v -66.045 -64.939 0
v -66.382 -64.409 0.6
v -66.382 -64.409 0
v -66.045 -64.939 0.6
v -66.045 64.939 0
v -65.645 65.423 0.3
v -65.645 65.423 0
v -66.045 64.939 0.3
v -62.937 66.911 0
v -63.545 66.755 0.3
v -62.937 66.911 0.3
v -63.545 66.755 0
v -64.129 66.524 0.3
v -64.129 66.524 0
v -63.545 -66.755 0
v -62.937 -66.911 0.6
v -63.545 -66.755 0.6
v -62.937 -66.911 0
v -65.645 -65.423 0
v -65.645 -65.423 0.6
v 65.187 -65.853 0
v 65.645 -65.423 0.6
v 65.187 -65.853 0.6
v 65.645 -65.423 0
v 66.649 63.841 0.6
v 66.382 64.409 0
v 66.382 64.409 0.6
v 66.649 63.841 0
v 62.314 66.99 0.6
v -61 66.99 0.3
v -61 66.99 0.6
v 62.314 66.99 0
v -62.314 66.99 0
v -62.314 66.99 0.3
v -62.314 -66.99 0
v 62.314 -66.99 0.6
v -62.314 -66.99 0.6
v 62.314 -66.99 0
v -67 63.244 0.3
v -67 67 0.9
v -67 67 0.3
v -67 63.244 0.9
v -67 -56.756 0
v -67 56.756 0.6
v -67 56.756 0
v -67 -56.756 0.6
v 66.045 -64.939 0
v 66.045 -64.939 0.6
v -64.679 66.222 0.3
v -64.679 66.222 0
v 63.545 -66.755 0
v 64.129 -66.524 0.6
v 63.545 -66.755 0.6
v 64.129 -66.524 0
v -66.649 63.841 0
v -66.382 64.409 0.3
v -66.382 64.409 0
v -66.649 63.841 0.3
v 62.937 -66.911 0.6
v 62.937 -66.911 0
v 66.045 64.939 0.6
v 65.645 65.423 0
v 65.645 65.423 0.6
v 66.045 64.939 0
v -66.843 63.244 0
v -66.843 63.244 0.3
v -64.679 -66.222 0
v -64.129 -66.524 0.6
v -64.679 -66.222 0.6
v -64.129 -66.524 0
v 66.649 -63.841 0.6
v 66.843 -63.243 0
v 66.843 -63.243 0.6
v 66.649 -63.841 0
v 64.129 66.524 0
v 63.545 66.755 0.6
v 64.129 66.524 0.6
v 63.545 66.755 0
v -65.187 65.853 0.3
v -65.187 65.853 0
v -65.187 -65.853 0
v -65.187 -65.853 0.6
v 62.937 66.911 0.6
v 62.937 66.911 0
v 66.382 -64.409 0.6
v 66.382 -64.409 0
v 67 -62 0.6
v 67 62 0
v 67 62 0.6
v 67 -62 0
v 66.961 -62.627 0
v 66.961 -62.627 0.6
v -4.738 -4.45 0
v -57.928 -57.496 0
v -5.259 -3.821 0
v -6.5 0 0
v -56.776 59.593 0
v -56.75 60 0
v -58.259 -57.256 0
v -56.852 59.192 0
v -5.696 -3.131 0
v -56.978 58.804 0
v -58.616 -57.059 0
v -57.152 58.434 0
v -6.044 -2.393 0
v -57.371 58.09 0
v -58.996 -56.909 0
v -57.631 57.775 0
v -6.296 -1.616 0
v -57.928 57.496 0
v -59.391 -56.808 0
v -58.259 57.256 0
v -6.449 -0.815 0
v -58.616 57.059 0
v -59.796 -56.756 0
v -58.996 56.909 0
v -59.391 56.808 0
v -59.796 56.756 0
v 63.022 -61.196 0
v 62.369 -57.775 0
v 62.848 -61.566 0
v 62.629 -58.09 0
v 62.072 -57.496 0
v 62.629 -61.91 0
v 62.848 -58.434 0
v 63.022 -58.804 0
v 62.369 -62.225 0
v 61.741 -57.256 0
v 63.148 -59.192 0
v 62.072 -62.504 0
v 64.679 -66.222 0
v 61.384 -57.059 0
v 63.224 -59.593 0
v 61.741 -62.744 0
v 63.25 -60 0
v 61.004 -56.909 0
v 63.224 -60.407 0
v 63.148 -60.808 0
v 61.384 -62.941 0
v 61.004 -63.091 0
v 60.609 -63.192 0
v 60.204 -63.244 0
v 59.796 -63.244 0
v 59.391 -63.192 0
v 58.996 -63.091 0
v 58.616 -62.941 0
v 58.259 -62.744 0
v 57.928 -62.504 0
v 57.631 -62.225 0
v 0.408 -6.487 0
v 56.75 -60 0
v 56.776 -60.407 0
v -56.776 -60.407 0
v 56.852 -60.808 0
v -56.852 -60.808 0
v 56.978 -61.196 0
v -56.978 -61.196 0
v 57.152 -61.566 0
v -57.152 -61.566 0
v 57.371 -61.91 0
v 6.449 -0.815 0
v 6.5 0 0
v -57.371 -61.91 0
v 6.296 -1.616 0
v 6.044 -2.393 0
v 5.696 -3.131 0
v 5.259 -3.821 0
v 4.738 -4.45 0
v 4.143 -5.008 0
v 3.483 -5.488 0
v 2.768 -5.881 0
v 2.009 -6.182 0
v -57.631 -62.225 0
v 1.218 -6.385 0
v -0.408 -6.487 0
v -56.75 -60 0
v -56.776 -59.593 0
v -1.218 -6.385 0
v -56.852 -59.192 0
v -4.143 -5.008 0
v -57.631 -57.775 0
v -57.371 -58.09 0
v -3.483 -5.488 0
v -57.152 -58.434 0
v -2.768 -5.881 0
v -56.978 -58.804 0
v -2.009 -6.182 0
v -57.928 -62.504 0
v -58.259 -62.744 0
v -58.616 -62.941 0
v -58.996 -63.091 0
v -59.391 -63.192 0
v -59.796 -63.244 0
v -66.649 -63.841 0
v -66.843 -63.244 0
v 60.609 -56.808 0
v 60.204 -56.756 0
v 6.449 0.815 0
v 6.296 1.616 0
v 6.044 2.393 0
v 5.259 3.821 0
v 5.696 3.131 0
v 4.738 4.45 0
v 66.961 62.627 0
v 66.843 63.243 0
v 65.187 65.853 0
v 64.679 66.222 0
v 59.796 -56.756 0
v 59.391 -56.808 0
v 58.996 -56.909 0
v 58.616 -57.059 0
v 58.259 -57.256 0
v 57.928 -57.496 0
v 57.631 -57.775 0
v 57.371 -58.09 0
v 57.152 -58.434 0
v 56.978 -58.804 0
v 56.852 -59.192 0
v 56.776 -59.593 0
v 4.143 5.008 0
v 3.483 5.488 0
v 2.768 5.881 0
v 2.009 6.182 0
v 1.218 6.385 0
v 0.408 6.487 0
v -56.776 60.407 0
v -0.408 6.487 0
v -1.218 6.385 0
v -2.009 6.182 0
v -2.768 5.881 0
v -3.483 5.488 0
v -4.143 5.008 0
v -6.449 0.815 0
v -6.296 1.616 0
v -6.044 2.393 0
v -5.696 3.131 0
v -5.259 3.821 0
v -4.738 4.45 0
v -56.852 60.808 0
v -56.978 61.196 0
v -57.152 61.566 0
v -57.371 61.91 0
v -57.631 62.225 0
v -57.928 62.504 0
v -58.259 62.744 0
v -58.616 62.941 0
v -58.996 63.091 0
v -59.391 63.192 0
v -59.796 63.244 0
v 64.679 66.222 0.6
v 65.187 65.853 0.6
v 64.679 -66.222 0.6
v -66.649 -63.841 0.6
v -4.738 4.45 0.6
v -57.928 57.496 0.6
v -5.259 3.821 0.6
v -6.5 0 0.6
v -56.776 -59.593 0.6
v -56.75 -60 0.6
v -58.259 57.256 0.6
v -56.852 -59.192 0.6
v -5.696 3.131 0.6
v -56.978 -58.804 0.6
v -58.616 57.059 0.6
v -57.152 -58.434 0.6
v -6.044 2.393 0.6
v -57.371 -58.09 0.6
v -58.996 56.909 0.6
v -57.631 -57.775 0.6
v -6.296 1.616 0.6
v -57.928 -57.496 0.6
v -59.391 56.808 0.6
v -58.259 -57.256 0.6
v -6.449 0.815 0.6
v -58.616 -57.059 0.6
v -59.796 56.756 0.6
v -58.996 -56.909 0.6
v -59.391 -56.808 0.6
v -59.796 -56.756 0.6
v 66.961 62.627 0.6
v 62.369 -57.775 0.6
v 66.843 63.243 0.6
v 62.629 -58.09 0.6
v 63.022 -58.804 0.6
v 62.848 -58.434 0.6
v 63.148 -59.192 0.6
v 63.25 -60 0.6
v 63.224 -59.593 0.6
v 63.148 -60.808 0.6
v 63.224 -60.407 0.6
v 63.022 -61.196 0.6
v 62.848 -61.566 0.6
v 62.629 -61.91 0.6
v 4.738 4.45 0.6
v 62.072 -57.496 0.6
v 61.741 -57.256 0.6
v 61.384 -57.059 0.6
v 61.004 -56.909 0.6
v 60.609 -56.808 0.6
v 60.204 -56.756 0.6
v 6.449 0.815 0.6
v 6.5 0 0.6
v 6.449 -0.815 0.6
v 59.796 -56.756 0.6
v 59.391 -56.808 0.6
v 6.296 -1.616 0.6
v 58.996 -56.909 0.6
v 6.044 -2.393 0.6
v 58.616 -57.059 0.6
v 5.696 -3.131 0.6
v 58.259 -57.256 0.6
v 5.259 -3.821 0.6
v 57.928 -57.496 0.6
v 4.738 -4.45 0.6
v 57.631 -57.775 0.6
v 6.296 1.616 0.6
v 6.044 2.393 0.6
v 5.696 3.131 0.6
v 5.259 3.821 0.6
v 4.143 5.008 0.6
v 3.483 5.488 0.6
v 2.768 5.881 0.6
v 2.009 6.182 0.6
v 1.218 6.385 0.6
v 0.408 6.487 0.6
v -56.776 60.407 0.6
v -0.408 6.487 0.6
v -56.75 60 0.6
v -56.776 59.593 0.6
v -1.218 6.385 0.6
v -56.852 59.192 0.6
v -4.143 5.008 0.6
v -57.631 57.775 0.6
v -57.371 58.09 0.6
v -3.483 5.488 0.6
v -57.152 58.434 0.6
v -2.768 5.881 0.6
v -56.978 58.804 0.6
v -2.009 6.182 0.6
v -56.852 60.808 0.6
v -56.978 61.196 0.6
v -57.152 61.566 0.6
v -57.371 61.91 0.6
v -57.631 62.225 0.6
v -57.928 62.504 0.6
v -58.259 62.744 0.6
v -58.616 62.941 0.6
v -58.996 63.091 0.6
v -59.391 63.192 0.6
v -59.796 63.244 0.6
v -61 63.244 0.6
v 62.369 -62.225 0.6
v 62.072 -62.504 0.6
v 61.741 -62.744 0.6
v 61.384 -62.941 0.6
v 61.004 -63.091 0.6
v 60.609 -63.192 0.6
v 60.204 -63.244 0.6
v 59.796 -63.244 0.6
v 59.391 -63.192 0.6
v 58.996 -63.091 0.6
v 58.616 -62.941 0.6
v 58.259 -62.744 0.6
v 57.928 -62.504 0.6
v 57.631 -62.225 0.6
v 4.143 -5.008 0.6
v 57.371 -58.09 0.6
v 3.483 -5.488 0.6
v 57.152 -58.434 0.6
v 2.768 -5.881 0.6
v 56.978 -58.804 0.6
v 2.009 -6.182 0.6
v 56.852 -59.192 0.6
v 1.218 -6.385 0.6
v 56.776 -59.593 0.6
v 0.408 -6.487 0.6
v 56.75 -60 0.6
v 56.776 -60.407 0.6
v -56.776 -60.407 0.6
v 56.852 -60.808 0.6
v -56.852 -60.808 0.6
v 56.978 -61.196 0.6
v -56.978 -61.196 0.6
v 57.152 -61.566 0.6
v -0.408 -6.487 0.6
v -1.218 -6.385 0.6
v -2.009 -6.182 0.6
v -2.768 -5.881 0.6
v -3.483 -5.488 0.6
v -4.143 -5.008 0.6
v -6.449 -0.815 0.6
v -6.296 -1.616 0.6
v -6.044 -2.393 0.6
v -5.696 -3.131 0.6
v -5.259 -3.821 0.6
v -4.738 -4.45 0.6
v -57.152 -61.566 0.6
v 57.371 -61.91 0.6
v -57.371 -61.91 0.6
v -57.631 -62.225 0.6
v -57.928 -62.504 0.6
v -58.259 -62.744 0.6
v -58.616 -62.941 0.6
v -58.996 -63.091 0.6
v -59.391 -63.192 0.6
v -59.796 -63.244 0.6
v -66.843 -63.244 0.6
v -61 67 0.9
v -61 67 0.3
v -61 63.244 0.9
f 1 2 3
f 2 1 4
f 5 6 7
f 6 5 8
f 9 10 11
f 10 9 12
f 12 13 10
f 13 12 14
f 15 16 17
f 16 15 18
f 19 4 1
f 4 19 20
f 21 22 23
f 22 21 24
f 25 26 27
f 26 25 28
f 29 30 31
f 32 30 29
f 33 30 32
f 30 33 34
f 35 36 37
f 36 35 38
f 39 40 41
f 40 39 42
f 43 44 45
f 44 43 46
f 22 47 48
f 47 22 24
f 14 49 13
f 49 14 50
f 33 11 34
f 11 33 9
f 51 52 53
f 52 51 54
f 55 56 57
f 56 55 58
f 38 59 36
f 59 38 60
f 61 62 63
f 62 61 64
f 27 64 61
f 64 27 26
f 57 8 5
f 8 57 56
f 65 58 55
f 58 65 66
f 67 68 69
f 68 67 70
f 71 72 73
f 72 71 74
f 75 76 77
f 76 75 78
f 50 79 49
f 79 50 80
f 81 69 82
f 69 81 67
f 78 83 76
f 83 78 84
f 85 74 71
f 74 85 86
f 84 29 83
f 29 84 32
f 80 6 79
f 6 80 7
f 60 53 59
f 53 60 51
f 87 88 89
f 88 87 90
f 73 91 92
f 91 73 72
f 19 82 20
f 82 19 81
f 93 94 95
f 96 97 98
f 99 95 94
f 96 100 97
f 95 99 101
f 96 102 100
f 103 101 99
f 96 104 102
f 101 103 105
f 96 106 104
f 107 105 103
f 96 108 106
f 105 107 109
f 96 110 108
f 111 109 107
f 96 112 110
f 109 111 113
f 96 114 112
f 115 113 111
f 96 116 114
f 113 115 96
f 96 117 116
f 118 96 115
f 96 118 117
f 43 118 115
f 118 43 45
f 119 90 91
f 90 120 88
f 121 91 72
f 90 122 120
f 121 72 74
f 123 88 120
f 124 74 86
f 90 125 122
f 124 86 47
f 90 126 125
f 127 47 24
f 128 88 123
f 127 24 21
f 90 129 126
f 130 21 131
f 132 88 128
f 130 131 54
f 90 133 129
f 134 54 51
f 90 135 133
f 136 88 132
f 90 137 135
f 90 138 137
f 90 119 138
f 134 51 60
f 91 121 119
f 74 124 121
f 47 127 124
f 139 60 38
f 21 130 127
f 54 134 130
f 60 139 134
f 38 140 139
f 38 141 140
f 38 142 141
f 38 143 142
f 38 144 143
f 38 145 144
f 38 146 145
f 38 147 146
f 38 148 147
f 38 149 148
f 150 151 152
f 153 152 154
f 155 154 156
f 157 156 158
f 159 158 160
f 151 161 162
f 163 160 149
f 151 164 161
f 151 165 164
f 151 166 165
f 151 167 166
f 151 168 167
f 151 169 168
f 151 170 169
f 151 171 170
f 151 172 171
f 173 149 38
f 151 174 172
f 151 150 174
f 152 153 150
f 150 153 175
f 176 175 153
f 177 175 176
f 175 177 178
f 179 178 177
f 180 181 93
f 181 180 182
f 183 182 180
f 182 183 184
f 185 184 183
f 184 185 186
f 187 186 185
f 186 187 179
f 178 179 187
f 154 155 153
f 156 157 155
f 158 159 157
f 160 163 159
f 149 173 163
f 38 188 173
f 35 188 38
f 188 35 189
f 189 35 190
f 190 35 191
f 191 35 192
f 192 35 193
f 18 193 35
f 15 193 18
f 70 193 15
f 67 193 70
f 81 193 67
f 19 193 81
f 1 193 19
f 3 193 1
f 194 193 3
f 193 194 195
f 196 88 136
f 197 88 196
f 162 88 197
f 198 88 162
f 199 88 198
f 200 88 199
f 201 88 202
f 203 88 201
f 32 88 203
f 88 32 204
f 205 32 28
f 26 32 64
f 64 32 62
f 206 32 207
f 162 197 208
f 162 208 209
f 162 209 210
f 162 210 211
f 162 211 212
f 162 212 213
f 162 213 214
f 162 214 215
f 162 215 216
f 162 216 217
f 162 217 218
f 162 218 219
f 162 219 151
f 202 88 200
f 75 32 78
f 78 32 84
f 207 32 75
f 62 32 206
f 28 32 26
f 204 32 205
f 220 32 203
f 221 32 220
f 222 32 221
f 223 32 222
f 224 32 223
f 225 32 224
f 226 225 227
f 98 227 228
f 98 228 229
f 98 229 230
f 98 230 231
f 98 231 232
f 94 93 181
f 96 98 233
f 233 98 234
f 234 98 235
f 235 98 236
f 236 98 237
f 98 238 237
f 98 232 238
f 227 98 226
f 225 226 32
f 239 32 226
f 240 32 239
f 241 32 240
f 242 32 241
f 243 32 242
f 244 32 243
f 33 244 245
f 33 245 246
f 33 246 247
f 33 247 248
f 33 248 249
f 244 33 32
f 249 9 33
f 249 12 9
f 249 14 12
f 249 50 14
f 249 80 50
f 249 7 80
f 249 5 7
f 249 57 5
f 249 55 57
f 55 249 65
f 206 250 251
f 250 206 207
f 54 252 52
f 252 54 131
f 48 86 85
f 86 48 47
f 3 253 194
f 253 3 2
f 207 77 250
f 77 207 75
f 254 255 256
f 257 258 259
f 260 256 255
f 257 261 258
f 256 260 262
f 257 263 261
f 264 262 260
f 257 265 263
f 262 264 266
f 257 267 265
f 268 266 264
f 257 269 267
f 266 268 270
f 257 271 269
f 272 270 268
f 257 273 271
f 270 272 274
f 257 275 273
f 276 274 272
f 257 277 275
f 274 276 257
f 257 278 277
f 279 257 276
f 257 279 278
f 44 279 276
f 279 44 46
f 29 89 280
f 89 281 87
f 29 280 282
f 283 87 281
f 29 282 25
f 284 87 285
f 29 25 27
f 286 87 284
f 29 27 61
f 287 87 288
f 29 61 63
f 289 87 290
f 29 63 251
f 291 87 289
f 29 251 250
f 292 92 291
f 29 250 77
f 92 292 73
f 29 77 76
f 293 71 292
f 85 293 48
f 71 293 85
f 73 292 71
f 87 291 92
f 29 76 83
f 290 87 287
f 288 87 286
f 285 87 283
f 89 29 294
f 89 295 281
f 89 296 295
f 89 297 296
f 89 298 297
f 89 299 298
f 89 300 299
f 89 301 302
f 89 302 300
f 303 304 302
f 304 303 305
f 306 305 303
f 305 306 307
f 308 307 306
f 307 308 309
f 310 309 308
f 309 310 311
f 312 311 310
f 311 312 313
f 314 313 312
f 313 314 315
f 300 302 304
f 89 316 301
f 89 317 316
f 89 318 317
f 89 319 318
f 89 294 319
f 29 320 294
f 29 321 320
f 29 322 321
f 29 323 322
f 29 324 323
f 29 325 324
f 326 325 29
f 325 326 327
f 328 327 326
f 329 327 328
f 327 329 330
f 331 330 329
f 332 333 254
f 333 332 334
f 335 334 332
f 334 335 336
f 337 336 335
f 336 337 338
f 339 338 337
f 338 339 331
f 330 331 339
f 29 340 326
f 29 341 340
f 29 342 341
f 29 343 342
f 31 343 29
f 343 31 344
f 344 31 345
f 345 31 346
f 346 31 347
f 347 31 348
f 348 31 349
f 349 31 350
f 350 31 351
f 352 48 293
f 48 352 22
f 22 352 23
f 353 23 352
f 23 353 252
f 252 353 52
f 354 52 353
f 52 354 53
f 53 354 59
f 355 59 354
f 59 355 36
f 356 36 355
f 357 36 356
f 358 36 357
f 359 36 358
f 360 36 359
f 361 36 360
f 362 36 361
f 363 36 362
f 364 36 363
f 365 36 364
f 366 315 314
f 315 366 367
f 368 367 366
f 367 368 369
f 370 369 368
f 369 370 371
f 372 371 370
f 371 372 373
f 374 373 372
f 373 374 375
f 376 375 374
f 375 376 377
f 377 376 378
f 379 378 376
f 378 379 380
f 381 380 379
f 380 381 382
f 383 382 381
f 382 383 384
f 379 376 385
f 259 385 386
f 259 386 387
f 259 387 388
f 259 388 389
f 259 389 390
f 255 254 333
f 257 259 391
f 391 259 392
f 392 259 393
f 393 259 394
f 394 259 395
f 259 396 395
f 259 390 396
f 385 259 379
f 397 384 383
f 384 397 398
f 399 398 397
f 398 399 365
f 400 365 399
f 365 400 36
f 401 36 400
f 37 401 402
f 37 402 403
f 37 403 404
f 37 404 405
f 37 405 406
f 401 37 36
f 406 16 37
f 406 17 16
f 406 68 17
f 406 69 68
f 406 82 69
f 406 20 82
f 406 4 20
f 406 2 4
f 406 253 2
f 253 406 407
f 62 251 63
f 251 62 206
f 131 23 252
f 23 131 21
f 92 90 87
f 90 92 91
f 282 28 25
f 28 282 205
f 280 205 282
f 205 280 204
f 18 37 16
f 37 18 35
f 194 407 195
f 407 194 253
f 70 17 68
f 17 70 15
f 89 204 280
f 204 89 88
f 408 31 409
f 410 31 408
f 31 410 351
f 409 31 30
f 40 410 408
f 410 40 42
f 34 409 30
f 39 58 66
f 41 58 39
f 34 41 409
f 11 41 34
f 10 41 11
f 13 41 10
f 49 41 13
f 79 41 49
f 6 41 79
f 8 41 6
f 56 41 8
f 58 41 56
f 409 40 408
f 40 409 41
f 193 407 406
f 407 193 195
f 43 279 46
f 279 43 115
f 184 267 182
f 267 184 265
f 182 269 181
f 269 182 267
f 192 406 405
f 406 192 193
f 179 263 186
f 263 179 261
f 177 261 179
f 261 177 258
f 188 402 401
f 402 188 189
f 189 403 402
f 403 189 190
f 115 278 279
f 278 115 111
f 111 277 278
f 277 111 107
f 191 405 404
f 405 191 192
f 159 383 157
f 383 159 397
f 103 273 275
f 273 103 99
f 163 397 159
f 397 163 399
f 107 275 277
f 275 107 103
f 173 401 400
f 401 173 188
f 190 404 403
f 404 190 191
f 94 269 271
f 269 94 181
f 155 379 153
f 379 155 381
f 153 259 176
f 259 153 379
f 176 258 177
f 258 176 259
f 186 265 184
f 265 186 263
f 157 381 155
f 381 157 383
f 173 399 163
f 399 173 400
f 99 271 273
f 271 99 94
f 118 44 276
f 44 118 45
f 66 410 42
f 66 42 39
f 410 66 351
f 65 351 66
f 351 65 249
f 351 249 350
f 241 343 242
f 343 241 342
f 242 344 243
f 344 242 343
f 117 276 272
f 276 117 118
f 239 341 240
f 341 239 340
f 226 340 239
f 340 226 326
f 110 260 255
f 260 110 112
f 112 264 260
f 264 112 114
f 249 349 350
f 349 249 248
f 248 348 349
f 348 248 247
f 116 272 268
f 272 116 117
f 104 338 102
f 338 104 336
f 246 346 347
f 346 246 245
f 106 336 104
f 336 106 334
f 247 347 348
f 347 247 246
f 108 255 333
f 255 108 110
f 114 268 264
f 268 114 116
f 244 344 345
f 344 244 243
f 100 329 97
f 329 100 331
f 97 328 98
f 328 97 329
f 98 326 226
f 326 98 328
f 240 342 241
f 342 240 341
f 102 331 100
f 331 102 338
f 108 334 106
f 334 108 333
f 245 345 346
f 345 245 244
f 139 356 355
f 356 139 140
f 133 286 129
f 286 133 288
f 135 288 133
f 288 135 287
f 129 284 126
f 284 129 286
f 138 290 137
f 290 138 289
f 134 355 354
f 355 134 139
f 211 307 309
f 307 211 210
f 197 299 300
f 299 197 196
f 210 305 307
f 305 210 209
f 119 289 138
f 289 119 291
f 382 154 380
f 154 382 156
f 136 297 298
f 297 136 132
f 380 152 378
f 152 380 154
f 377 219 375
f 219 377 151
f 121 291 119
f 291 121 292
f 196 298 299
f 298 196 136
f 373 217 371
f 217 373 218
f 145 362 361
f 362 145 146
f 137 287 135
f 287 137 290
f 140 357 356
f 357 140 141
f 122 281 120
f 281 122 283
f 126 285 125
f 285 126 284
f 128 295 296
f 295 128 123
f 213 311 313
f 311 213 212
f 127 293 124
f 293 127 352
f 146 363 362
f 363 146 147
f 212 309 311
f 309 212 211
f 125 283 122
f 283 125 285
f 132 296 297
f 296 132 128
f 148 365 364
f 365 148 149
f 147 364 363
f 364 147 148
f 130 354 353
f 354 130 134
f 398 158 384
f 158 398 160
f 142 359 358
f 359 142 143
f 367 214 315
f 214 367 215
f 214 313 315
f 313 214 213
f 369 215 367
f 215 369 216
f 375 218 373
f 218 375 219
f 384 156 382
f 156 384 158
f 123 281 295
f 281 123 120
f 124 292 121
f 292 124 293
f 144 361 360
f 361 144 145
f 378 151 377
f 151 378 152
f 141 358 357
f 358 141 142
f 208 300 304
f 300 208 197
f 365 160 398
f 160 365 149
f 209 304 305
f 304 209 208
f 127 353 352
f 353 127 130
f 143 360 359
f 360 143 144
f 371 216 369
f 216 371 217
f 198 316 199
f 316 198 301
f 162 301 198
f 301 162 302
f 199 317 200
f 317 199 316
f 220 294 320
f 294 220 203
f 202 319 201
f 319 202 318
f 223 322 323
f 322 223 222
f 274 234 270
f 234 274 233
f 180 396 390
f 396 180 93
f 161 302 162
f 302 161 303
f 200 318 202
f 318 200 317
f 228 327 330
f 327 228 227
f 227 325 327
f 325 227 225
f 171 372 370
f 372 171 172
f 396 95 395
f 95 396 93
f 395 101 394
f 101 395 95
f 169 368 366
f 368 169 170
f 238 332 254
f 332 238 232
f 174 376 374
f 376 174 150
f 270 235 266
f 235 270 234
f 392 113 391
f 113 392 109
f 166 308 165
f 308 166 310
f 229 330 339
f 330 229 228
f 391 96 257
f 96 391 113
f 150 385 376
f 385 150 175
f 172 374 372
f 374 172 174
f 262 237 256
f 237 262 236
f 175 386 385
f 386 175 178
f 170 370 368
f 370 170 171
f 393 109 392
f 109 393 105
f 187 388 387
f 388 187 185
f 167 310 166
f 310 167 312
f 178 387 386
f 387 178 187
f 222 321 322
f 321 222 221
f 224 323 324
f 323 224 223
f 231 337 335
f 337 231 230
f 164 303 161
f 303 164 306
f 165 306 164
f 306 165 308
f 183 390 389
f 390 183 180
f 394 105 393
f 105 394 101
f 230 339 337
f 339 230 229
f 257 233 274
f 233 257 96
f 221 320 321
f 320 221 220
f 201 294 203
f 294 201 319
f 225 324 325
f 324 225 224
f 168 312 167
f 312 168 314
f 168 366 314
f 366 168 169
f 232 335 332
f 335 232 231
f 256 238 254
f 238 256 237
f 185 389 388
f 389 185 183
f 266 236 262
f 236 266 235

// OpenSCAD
$fn = 50;


difference() {
	union() {
		translate(v = [0, 0, 0]) {
			rotate(a = [0, 0, 0]) {
				hull() {
					translate(v = [-62.0000000000, 62.0000000000, 0]) {
						rotate(a = [0, 0, 0]) {
							translate(v = [0, 0, 0]) {
								rotate(a = [0, 0, 0]) {
									cylinder(h = 0.6000000000, r = 5);
								}
							}
						}
					}
					translate(v = [62.0000000000, 62.0000000000, 0]) {
						rotate(a = [0, 0, 0]) {
							translate(v = [0, 0, 0]) {
								rotate(a = [0, 0, 0]) {
									cylinder(h = 0.6000000000, r = 5);
								}
							}
						}
					}
					translate(v = [-62.0000000000, -62.0000000000, 0]) {
						rotate(a = [0, 0, 0]) {
							translate(v = [0, 0, 0]) {
								rotate(a = [0, 0, 0]) {
									cylinder(h = 0.6000000000, r = 5);
								}
							}
						}
					}
					translate(v = [62.0000000000, -62.0000000000, 0]) {
						rotate(a = [0, 0, 0]) {
							translate(v = [0, 0, 0]) {
								rotate(a = [0, 0, 0]) {
									cylinder(h = 0.6000000000, r = 5);
								}
							}
						}
					}
				}
			}
		}
		#translate(v = [-67.0000000000, 61.0000000000, 0.3000000000]) {
			rotate(a = [0, 0, 0]) {
				cube(size = [6, 6, 0.6000000000]);
			}
		}
	}
	union() {
		translate(v = [-67.5000000000, -60.0000000000, -125]) {
			rotate(a = [0, 0, 0]) {
				hull() {
					translate(v = [7.5000000000, 0, 0]) {
						rotate(a = [0, 0, 0]) {
							translate(v = [0, 0, 0]) {
								rotate(a = [0, 0, 0]) {
									cylinder(h = 250, r = 3.2500000000);
								}
							}
						}
					}
					translate(v = [-7.5000000000, 0, 0]) {
						rotate(a = [0, 0, 0]) {
							translate(v = [0, 0, 0]) {
								rotate(a = [0, 0, 0]) {
									cylinder(h = 250, r = 3.2500000000);
								}
							}
						}
					}
				}
			}
		}
		translate(v = [-67.5000000000, 60.0000000000, -125]) {
			rotate(a = [0, 0, 0]) {
				hull() {
					translate(v = [7.5000000000, 0, 0]) {
						rotate(a = [0, 0, 0]) {
							translate(v = [0, 0, 0]) {
								rotate(a = [0, 0, 0]) {
									cylinder(h = 250, r = 3.2500000000);
								}
							}
						}
					}
					translate(v = [-7.5000000000, 0, 0]) {
						rotate(a = [0, 0, 0]) {
							translate(v = [0, 0, 0]) {
								rotate(a = [0, 0, 0]) {
									cylinder(h = 250, r = 3.2500000000);
								}
							}
						}
					}
				}
			}
		}
		translate(v = [60.0000000000, -60.0000000000, -125.0000000000]) {
			rotate(a = [0, 0, 0]) {
				cylinder(h = 250, r = 3.2500000000);
			}
		}
		translate(v = [0, 0, 0.0000000000]) {
			rotate(a = [0, 0, 0]) {
				cylinder(h = 0.6000000000, r = 6.5000000000);
			}
		}
	}
}
